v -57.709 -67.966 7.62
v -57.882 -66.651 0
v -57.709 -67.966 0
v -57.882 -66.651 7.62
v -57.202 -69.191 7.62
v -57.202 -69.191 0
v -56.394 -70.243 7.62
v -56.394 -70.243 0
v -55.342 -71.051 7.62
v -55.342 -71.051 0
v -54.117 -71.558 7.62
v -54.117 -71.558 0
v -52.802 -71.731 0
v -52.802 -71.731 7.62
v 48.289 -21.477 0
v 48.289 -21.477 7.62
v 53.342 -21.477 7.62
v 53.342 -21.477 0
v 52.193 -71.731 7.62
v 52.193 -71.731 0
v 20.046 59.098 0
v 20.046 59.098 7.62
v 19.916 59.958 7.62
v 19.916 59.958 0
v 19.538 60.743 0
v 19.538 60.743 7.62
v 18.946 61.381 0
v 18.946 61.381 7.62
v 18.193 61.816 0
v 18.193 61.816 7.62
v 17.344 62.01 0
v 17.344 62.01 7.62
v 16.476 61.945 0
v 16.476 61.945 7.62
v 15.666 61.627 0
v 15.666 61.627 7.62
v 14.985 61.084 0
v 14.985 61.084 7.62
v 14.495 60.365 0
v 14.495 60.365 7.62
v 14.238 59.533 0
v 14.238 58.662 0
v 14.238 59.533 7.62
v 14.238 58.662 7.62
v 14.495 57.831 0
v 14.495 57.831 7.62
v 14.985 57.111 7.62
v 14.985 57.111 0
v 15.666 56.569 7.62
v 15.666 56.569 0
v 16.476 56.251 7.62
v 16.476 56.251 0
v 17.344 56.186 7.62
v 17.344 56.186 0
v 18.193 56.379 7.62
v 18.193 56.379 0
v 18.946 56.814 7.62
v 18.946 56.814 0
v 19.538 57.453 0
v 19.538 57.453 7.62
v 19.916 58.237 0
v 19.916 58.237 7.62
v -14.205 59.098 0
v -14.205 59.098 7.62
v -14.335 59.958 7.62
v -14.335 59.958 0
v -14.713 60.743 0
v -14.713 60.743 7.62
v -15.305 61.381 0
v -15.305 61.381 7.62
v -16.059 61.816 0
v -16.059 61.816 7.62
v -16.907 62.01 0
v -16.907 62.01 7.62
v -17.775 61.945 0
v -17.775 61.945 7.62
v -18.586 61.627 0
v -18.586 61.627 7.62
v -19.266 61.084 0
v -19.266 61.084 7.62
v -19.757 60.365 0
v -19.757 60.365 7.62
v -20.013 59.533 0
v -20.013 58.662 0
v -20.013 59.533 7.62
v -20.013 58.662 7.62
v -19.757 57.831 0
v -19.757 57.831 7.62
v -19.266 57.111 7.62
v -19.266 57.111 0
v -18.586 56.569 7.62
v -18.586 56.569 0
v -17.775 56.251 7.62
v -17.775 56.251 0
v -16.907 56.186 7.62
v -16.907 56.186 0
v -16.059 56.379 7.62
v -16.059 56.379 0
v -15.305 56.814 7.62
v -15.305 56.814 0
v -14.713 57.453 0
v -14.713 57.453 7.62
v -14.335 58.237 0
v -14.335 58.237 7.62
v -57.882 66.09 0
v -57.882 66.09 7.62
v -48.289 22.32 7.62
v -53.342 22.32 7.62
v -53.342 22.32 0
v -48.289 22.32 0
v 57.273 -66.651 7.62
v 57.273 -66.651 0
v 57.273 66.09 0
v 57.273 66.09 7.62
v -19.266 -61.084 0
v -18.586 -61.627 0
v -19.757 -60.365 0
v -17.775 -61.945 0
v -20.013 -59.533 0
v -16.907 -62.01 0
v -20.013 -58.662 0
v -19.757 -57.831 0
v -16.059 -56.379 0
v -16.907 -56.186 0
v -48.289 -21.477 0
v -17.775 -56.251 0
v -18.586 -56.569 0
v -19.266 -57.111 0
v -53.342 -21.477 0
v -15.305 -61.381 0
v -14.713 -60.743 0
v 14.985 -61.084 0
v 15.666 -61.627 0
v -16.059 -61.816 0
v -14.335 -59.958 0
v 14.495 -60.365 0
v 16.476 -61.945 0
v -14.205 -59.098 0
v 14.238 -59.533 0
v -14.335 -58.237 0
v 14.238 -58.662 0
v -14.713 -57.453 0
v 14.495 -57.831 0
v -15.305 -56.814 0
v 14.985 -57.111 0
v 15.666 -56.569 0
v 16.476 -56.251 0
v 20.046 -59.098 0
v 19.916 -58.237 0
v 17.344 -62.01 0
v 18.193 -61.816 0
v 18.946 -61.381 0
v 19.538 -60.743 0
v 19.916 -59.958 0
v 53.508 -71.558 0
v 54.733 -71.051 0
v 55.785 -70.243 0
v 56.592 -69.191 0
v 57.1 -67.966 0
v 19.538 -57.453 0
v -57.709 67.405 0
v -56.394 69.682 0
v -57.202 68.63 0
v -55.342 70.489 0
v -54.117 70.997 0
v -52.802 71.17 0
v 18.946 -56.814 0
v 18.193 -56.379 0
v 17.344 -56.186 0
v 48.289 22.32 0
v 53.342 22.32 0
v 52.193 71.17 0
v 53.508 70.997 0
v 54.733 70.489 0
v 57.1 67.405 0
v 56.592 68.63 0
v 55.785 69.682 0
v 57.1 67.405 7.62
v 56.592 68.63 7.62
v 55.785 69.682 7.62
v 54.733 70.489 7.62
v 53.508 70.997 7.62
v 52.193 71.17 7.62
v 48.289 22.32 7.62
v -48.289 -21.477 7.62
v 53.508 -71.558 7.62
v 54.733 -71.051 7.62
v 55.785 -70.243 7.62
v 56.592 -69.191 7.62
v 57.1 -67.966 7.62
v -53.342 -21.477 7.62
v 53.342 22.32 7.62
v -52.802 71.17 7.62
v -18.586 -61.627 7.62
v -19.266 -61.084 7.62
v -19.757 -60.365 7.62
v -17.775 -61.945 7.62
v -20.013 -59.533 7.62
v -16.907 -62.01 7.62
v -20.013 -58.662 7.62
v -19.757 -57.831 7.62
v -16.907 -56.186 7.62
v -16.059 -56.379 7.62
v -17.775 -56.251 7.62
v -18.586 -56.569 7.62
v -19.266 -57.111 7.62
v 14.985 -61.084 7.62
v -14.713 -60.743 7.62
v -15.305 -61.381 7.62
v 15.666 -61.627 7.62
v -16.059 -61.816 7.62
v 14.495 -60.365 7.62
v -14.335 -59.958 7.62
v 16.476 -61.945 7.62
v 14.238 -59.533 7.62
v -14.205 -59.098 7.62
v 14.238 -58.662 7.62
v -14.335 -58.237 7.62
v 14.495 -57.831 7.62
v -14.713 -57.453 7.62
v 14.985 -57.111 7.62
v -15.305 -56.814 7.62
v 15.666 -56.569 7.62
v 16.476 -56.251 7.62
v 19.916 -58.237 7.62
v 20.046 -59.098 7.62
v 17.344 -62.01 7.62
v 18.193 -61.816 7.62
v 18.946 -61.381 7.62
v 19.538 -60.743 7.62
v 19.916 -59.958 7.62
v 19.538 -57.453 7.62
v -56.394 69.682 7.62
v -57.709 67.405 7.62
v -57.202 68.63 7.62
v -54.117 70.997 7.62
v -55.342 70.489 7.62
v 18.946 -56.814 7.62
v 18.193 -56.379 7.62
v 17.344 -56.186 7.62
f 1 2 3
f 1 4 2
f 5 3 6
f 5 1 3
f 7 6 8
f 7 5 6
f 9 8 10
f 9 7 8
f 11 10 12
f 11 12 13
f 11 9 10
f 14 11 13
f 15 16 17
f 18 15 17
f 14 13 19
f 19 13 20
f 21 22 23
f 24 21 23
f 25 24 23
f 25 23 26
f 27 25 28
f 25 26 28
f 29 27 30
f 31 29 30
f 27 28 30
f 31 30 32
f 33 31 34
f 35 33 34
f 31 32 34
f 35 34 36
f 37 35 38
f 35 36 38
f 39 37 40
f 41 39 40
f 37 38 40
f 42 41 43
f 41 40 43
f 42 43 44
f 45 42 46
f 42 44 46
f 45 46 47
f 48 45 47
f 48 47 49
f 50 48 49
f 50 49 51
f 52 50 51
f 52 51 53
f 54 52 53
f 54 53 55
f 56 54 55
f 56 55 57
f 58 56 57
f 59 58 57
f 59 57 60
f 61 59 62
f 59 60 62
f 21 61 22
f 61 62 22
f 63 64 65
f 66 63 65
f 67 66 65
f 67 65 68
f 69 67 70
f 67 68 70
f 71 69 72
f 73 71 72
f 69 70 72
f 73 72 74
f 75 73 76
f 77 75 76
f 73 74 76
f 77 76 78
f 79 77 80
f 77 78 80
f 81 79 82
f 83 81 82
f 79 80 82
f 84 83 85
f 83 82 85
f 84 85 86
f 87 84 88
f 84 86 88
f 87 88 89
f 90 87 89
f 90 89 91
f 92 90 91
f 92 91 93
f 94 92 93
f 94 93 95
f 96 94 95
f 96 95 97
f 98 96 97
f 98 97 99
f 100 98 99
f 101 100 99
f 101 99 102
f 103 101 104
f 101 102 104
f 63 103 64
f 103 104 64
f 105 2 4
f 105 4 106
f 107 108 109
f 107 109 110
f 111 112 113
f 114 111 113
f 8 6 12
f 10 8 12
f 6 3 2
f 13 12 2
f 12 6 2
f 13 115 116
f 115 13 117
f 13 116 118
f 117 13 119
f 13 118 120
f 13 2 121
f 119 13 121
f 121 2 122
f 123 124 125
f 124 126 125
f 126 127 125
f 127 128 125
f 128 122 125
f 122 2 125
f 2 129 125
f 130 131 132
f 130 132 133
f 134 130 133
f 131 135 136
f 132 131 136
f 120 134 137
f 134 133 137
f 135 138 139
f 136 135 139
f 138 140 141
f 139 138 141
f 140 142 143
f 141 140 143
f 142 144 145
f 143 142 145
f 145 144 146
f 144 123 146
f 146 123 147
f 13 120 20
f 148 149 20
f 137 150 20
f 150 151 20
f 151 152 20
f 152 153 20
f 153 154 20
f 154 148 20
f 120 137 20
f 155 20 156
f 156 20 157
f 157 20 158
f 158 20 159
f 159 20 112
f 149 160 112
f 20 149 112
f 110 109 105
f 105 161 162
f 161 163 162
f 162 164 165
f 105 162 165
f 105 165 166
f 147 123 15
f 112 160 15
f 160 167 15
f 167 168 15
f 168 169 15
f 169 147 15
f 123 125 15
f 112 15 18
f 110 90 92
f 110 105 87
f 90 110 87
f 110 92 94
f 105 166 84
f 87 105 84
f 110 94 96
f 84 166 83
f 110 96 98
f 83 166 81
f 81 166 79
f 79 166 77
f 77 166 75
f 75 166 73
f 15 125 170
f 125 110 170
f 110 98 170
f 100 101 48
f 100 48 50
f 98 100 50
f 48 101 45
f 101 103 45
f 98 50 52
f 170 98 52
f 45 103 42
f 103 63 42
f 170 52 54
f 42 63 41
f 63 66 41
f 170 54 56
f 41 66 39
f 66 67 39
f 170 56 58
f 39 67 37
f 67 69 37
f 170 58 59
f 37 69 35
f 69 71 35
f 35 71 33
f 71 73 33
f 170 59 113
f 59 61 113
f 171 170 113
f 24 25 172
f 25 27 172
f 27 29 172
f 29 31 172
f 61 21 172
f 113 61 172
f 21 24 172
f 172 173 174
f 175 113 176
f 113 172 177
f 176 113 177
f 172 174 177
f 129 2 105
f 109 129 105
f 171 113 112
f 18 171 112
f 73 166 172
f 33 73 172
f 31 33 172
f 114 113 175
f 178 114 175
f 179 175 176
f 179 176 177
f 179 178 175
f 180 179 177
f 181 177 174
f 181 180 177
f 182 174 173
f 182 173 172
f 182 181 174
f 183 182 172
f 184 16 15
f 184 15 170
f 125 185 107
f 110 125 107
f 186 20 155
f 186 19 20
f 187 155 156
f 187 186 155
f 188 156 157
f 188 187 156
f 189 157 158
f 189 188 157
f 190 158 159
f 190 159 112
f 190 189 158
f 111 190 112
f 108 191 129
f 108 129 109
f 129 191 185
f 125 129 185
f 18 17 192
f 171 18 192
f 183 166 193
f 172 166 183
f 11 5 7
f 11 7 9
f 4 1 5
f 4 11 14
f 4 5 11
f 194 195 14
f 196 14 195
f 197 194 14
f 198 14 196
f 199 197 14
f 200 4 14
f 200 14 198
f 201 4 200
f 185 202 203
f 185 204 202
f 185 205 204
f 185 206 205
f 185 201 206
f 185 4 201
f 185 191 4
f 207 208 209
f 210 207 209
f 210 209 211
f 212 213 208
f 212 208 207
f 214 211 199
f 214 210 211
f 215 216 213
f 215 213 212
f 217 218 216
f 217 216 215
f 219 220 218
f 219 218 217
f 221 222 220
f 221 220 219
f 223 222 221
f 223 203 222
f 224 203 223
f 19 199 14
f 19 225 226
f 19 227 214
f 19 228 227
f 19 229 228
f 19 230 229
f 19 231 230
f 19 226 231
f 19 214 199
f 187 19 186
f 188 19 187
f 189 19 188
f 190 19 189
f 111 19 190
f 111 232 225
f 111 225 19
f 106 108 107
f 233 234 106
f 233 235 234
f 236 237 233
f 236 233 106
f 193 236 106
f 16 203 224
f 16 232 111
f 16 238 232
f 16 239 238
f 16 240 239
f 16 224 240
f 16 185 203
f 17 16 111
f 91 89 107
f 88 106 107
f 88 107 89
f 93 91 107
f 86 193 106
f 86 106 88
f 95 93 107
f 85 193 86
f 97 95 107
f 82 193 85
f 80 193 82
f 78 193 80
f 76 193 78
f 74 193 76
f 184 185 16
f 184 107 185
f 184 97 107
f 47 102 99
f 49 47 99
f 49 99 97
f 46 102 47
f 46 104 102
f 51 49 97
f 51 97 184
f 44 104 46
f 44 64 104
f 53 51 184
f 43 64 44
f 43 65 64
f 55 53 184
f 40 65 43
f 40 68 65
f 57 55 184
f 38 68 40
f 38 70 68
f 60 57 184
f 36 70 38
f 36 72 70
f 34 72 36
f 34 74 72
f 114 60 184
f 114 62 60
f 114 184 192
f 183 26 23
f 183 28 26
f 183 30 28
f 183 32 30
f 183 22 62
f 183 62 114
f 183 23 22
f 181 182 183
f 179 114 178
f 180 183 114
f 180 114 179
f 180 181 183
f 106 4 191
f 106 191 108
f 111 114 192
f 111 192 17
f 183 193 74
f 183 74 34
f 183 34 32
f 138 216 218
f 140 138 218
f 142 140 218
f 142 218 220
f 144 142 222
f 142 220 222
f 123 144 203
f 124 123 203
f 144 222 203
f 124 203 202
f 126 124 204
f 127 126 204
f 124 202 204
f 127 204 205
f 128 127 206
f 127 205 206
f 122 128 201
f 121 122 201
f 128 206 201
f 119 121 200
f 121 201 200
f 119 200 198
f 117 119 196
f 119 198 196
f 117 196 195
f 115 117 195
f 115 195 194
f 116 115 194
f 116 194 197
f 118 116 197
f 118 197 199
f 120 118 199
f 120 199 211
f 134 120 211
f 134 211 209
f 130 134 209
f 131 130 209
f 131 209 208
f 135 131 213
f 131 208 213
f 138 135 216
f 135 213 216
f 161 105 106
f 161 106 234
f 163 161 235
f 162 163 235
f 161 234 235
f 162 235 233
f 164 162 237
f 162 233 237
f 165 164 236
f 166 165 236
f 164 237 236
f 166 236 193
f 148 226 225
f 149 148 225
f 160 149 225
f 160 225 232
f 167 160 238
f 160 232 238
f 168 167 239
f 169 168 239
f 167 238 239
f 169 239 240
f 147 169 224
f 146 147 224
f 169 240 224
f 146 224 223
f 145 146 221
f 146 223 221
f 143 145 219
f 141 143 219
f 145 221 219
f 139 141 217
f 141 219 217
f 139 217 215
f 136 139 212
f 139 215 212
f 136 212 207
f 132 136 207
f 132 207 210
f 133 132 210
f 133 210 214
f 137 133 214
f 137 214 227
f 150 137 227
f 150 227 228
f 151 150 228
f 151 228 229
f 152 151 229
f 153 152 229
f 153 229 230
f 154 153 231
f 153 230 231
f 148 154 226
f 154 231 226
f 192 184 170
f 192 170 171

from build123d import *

# Parameters (mm, degrees)
F0_W     = 115.1548996568
F0_H     = 142.901070416
F1_DEPTH = 7.62
F2_R     = 5.08
F3_W     = 5.0534754992
F3_H     = 43.796794489
F3_R     = 2.9202239124
F4_DEPTH = 7.62


# Not quite as in the source:
# - a feature names something its author has since deleted; it is built from what else it names


with BuildPart() as f1:
    # F0 (on Top) → F1 (new body)
    with BuildSketch(Plane.XY):
        with Locations((-0.3047175705, -0.2807490528)):
            Rectangle(F0_W, F0_H)
    extrude(amount=F1_DEPTH)

    # F2
    f2_edges = [f1.edges().sort_by_distance(p)[0] for p in [
        (-57.882167, -71.731284, 3.81),
        (-57.882167, 71.169786, 3.81),
        (57.272732, -71.731284, 3.81),
        (57.272732, 71.169786, 3.81),
    ]]
    fillet(f2_edges, radius=F2_R)

    # F3 (on face) + F0 (on Top) → F4 (cut)
    with BuildSketch(Plane.XY.offset(7.62)):
        with Locations((-50.8155077696, 0.4211226478)):
            Rectangle(F3_W, F3_H)
        with Locations((17.1256698668, 59.0975955129)):
            Circle(F3_R)
        with Locations((50.8155077696, 0.4211226478)):
            Rectangle(F3_W, F3_H)
        with Locations((-17.1256698668, 59.0975955129)):
            Circle(F3_R)
        with Locations((-17.1256698668, -59.0975955129)):
            Circle(F3_R)
        with Locations((17.1256698668, -59.0975955129)):
            Circle(F3_R)
    with BuildSketch(Plane.XY):
        with Locations((-0.3047175705, -0.2807490528)):
            Rectangle(F0_W, F0_H)
    extrude(amount=-F4_DEPTH, mode=Mode.SUBTRACT)


solid = f1.part
